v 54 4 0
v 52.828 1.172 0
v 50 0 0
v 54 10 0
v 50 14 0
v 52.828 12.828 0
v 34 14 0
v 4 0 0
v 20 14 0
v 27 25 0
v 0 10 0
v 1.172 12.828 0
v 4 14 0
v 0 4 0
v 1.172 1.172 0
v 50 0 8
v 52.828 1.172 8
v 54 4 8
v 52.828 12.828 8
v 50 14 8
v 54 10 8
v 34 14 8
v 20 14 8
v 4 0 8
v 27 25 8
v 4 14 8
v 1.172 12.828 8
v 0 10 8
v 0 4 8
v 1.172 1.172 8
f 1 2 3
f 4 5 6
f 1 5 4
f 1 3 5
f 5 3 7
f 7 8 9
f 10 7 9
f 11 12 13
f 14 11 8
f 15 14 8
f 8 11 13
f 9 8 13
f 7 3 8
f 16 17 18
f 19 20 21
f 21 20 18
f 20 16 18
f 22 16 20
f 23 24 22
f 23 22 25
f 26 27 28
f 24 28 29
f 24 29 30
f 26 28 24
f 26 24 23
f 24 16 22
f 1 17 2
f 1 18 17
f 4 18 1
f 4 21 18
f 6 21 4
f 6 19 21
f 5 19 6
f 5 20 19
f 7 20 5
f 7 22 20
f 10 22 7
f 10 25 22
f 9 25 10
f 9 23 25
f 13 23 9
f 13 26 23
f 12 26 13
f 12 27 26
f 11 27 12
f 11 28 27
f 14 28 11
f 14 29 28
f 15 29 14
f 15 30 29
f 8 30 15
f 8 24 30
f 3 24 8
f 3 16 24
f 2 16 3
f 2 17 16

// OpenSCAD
$fn = 32;

// ----------------------------------------------------------------------
// Ratchet pawl: 54 x 14 mm body, beak 11 mm сверху
// ----------------------------------------------------------------------

// --- parameters (mm) ---
profile_height = 8;       // extrusion height
profile_points = 15;      // points of the closed outline

profile = [[0, 4], [1.172, 1.172], [4, 0], [50, 0], [52.828, 1.172], [54, 4], [54, 10], [52.828, 12.828], [50, 14], [34, 14], [27, 25], [20, 14], [4, 14], [1.172, 12.828], [0, 10]];  // single closed polygon, 15 points, counter clockwise

// --- the one profile operation ---
linear_extrude(height = profile_height) polygon(points = profile);
